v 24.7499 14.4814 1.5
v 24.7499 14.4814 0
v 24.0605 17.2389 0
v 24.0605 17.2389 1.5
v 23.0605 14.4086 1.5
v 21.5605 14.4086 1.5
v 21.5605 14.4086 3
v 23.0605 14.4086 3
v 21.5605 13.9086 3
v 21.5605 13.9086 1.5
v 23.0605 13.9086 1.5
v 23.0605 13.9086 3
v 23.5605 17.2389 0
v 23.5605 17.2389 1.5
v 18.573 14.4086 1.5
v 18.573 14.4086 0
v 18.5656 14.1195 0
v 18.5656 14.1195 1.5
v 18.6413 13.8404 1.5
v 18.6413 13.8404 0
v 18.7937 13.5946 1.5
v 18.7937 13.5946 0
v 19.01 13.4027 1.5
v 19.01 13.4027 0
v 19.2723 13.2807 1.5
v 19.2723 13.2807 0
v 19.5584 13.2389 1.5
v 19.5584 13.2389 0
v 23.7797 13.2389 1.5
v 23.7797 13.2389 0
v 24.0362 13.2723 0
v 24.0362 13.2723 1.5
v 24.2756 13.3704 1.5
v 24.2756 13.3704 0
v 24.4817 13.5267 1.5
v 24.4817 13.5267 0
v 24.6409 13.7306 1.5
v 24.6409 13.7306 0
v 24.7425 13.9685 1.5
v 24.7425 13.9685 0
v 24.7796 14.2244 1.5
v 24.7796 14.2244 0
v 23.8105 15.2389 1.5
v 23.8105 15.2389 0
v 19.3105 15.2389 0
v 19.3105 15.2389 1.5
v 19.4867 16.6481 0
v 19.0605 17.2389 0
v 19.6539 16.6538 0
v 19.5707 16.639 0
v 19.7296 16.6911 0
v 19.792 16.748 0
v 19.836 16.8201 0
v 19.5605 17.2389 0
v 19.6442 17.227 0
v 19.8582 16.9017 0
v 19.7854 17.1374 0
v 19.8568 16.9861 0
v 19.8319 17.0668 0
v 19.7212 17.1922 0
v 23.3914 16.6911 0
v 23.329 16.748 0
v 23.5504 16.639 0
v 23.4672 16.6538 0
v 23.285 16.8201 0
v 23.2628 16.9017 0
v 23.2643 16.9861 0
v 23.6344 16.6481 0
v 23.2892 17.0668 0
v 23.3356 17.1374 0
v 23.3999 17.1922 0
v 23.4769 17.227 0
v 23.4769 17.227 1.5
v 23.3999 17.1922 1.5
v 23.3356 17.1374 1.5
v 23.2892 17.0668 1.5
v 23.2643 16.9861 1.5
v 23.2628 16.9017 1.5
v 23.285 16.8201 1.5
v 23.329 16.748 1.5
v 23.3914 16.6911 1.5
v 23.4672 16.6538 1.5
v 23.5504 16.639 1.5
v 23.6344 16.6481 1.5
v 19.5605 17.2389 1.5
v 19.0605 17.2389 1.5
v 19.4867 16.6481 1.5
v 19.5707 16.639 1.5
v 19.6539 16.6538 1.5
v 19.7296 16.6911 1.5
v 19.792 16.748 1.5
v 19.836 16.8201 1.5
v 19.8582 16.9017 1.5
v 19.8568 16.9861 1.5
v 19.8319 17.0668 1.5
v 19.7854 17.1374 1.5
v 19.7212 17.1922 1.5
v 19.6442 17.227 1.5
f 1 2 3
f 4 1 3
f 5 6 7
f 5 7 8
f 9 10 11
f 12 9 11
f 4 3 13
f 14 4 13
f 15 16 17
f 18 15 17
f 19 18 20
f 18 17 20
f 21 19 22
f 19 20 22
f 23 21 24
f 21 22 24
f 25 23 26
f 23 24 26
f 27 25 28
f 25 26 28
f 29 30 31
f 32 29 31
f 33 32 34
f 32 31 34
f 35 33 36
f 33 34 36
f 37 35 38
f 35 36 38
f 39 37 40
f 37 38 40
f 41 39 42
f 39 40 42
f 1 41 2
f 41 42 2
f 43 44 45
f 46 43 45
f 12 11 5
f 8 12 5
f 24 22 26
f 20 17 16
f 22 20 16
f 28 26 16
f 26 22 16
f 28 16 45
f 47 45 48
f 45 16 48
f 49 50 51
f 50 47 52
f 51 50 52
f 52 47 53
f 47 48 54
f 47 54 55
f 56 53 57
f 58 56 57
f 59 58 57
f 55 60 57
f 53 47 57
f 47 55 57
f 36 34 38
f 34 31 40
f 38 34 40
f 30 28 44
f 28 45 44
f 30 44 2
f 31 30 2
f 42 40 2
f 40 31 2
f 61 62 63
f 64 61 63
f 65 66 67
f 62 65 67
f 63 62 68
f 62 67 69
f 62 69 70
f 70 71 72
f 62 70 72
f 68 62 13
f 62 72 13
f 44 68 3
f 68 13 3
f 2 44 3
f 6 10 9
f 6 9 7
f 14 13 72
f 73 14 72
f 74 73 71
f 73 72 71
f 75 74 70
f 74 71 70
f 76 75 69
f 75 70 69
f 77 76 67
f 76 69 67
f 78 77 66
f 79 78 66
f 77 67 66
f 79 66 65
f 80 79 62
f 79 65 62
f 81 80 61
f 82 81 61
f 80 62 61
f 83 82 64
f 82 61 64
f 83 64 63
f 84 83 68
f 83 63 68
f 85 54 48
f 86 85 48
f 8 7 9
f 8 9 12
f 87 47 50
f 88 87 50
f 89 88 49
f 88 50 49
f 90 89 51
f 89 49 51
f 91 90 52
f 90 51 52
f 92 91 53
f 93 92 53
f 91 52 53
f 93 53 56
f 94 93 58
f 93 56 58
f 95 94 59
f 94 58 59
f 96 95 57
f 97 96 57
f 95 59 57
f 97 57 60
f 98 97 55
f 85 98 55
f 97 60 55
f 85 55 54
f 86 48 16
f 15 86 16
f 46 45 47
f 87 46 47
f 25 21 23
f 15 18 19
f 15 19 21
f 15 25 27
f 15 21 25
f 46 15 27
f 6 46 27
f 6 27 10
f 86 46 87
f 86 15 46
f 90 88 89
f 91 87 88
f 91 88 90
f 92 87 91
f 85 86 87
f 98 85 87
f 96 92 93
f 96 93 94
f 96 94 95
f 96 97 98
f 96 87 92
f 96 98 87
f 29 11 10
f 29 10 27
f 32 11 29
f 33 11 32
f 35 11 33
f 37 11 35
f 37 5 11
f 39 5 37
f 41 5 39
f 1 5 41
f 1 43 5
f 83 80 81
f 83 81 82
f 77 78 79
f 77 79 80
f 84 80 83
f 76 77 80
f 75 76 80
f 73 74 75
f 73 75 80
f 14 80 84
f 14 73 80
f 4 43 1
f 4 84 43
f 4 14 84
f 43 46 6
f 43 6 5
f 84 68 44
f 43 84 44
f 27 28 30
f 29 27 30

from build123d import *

# Parameters (mm, degrees)
F1_DEPTH = 1.5
F2_W     = 1.5
F2_H     = 0.5
F3_DEPTH = 1.5


with BuildPart() as f1:
    # F0 (on Top) → F1 (new body)
    with BuildSketch(Plane.XY):
        with BuildLine():
            Line((19.310524, 15.238866), (19.486678, 16.648096))
            ThreePointArc((19.486678, 16.648096), (19.858208, 16.901655), (19.560524, 17.238866))
            Line((19.560524, 17.238866), (19.060524, 17.238866))
            Line((19.060524, 17.238866), (18.572963, 14.408634))
            ThreePointArc((18.572963, 14.408634), (18.79367, 13.594571), (19.558447, 13.238866))
            Line((19.558447, 13.238866), (23.779748, 13.238866))
            ThreePointArc((23.779748, 13.238866), (24.567953, 13.623453), (24.74989, 14.481401))
            Line((24.74989, 14.481401), (24.060524, 17.238866))
            Line((24.060524, 17.238866), (23.560524, 17.238866))
            ThreePointArc((23.560524, 17.238866), (23.262841, 16.901655), (23.63437, 16.648096))
            Line((23.63437, 16.648096), (23.810524, 15.238866))
            Line((23.810524, 15.238866), (19.310524, 15.238866))
        make_face()
    extrude(amount=F1_DEPTH)

    # F2 (on face) → F3 (join)
    with BuildSketch(Plane.XY.offset(1.5)):
        with Locations((22.310524, 14.158634)):
            Rectangle(F2_W, F2_H)
    extrude(amount=F3_DEPTH)


solid = f1.part
